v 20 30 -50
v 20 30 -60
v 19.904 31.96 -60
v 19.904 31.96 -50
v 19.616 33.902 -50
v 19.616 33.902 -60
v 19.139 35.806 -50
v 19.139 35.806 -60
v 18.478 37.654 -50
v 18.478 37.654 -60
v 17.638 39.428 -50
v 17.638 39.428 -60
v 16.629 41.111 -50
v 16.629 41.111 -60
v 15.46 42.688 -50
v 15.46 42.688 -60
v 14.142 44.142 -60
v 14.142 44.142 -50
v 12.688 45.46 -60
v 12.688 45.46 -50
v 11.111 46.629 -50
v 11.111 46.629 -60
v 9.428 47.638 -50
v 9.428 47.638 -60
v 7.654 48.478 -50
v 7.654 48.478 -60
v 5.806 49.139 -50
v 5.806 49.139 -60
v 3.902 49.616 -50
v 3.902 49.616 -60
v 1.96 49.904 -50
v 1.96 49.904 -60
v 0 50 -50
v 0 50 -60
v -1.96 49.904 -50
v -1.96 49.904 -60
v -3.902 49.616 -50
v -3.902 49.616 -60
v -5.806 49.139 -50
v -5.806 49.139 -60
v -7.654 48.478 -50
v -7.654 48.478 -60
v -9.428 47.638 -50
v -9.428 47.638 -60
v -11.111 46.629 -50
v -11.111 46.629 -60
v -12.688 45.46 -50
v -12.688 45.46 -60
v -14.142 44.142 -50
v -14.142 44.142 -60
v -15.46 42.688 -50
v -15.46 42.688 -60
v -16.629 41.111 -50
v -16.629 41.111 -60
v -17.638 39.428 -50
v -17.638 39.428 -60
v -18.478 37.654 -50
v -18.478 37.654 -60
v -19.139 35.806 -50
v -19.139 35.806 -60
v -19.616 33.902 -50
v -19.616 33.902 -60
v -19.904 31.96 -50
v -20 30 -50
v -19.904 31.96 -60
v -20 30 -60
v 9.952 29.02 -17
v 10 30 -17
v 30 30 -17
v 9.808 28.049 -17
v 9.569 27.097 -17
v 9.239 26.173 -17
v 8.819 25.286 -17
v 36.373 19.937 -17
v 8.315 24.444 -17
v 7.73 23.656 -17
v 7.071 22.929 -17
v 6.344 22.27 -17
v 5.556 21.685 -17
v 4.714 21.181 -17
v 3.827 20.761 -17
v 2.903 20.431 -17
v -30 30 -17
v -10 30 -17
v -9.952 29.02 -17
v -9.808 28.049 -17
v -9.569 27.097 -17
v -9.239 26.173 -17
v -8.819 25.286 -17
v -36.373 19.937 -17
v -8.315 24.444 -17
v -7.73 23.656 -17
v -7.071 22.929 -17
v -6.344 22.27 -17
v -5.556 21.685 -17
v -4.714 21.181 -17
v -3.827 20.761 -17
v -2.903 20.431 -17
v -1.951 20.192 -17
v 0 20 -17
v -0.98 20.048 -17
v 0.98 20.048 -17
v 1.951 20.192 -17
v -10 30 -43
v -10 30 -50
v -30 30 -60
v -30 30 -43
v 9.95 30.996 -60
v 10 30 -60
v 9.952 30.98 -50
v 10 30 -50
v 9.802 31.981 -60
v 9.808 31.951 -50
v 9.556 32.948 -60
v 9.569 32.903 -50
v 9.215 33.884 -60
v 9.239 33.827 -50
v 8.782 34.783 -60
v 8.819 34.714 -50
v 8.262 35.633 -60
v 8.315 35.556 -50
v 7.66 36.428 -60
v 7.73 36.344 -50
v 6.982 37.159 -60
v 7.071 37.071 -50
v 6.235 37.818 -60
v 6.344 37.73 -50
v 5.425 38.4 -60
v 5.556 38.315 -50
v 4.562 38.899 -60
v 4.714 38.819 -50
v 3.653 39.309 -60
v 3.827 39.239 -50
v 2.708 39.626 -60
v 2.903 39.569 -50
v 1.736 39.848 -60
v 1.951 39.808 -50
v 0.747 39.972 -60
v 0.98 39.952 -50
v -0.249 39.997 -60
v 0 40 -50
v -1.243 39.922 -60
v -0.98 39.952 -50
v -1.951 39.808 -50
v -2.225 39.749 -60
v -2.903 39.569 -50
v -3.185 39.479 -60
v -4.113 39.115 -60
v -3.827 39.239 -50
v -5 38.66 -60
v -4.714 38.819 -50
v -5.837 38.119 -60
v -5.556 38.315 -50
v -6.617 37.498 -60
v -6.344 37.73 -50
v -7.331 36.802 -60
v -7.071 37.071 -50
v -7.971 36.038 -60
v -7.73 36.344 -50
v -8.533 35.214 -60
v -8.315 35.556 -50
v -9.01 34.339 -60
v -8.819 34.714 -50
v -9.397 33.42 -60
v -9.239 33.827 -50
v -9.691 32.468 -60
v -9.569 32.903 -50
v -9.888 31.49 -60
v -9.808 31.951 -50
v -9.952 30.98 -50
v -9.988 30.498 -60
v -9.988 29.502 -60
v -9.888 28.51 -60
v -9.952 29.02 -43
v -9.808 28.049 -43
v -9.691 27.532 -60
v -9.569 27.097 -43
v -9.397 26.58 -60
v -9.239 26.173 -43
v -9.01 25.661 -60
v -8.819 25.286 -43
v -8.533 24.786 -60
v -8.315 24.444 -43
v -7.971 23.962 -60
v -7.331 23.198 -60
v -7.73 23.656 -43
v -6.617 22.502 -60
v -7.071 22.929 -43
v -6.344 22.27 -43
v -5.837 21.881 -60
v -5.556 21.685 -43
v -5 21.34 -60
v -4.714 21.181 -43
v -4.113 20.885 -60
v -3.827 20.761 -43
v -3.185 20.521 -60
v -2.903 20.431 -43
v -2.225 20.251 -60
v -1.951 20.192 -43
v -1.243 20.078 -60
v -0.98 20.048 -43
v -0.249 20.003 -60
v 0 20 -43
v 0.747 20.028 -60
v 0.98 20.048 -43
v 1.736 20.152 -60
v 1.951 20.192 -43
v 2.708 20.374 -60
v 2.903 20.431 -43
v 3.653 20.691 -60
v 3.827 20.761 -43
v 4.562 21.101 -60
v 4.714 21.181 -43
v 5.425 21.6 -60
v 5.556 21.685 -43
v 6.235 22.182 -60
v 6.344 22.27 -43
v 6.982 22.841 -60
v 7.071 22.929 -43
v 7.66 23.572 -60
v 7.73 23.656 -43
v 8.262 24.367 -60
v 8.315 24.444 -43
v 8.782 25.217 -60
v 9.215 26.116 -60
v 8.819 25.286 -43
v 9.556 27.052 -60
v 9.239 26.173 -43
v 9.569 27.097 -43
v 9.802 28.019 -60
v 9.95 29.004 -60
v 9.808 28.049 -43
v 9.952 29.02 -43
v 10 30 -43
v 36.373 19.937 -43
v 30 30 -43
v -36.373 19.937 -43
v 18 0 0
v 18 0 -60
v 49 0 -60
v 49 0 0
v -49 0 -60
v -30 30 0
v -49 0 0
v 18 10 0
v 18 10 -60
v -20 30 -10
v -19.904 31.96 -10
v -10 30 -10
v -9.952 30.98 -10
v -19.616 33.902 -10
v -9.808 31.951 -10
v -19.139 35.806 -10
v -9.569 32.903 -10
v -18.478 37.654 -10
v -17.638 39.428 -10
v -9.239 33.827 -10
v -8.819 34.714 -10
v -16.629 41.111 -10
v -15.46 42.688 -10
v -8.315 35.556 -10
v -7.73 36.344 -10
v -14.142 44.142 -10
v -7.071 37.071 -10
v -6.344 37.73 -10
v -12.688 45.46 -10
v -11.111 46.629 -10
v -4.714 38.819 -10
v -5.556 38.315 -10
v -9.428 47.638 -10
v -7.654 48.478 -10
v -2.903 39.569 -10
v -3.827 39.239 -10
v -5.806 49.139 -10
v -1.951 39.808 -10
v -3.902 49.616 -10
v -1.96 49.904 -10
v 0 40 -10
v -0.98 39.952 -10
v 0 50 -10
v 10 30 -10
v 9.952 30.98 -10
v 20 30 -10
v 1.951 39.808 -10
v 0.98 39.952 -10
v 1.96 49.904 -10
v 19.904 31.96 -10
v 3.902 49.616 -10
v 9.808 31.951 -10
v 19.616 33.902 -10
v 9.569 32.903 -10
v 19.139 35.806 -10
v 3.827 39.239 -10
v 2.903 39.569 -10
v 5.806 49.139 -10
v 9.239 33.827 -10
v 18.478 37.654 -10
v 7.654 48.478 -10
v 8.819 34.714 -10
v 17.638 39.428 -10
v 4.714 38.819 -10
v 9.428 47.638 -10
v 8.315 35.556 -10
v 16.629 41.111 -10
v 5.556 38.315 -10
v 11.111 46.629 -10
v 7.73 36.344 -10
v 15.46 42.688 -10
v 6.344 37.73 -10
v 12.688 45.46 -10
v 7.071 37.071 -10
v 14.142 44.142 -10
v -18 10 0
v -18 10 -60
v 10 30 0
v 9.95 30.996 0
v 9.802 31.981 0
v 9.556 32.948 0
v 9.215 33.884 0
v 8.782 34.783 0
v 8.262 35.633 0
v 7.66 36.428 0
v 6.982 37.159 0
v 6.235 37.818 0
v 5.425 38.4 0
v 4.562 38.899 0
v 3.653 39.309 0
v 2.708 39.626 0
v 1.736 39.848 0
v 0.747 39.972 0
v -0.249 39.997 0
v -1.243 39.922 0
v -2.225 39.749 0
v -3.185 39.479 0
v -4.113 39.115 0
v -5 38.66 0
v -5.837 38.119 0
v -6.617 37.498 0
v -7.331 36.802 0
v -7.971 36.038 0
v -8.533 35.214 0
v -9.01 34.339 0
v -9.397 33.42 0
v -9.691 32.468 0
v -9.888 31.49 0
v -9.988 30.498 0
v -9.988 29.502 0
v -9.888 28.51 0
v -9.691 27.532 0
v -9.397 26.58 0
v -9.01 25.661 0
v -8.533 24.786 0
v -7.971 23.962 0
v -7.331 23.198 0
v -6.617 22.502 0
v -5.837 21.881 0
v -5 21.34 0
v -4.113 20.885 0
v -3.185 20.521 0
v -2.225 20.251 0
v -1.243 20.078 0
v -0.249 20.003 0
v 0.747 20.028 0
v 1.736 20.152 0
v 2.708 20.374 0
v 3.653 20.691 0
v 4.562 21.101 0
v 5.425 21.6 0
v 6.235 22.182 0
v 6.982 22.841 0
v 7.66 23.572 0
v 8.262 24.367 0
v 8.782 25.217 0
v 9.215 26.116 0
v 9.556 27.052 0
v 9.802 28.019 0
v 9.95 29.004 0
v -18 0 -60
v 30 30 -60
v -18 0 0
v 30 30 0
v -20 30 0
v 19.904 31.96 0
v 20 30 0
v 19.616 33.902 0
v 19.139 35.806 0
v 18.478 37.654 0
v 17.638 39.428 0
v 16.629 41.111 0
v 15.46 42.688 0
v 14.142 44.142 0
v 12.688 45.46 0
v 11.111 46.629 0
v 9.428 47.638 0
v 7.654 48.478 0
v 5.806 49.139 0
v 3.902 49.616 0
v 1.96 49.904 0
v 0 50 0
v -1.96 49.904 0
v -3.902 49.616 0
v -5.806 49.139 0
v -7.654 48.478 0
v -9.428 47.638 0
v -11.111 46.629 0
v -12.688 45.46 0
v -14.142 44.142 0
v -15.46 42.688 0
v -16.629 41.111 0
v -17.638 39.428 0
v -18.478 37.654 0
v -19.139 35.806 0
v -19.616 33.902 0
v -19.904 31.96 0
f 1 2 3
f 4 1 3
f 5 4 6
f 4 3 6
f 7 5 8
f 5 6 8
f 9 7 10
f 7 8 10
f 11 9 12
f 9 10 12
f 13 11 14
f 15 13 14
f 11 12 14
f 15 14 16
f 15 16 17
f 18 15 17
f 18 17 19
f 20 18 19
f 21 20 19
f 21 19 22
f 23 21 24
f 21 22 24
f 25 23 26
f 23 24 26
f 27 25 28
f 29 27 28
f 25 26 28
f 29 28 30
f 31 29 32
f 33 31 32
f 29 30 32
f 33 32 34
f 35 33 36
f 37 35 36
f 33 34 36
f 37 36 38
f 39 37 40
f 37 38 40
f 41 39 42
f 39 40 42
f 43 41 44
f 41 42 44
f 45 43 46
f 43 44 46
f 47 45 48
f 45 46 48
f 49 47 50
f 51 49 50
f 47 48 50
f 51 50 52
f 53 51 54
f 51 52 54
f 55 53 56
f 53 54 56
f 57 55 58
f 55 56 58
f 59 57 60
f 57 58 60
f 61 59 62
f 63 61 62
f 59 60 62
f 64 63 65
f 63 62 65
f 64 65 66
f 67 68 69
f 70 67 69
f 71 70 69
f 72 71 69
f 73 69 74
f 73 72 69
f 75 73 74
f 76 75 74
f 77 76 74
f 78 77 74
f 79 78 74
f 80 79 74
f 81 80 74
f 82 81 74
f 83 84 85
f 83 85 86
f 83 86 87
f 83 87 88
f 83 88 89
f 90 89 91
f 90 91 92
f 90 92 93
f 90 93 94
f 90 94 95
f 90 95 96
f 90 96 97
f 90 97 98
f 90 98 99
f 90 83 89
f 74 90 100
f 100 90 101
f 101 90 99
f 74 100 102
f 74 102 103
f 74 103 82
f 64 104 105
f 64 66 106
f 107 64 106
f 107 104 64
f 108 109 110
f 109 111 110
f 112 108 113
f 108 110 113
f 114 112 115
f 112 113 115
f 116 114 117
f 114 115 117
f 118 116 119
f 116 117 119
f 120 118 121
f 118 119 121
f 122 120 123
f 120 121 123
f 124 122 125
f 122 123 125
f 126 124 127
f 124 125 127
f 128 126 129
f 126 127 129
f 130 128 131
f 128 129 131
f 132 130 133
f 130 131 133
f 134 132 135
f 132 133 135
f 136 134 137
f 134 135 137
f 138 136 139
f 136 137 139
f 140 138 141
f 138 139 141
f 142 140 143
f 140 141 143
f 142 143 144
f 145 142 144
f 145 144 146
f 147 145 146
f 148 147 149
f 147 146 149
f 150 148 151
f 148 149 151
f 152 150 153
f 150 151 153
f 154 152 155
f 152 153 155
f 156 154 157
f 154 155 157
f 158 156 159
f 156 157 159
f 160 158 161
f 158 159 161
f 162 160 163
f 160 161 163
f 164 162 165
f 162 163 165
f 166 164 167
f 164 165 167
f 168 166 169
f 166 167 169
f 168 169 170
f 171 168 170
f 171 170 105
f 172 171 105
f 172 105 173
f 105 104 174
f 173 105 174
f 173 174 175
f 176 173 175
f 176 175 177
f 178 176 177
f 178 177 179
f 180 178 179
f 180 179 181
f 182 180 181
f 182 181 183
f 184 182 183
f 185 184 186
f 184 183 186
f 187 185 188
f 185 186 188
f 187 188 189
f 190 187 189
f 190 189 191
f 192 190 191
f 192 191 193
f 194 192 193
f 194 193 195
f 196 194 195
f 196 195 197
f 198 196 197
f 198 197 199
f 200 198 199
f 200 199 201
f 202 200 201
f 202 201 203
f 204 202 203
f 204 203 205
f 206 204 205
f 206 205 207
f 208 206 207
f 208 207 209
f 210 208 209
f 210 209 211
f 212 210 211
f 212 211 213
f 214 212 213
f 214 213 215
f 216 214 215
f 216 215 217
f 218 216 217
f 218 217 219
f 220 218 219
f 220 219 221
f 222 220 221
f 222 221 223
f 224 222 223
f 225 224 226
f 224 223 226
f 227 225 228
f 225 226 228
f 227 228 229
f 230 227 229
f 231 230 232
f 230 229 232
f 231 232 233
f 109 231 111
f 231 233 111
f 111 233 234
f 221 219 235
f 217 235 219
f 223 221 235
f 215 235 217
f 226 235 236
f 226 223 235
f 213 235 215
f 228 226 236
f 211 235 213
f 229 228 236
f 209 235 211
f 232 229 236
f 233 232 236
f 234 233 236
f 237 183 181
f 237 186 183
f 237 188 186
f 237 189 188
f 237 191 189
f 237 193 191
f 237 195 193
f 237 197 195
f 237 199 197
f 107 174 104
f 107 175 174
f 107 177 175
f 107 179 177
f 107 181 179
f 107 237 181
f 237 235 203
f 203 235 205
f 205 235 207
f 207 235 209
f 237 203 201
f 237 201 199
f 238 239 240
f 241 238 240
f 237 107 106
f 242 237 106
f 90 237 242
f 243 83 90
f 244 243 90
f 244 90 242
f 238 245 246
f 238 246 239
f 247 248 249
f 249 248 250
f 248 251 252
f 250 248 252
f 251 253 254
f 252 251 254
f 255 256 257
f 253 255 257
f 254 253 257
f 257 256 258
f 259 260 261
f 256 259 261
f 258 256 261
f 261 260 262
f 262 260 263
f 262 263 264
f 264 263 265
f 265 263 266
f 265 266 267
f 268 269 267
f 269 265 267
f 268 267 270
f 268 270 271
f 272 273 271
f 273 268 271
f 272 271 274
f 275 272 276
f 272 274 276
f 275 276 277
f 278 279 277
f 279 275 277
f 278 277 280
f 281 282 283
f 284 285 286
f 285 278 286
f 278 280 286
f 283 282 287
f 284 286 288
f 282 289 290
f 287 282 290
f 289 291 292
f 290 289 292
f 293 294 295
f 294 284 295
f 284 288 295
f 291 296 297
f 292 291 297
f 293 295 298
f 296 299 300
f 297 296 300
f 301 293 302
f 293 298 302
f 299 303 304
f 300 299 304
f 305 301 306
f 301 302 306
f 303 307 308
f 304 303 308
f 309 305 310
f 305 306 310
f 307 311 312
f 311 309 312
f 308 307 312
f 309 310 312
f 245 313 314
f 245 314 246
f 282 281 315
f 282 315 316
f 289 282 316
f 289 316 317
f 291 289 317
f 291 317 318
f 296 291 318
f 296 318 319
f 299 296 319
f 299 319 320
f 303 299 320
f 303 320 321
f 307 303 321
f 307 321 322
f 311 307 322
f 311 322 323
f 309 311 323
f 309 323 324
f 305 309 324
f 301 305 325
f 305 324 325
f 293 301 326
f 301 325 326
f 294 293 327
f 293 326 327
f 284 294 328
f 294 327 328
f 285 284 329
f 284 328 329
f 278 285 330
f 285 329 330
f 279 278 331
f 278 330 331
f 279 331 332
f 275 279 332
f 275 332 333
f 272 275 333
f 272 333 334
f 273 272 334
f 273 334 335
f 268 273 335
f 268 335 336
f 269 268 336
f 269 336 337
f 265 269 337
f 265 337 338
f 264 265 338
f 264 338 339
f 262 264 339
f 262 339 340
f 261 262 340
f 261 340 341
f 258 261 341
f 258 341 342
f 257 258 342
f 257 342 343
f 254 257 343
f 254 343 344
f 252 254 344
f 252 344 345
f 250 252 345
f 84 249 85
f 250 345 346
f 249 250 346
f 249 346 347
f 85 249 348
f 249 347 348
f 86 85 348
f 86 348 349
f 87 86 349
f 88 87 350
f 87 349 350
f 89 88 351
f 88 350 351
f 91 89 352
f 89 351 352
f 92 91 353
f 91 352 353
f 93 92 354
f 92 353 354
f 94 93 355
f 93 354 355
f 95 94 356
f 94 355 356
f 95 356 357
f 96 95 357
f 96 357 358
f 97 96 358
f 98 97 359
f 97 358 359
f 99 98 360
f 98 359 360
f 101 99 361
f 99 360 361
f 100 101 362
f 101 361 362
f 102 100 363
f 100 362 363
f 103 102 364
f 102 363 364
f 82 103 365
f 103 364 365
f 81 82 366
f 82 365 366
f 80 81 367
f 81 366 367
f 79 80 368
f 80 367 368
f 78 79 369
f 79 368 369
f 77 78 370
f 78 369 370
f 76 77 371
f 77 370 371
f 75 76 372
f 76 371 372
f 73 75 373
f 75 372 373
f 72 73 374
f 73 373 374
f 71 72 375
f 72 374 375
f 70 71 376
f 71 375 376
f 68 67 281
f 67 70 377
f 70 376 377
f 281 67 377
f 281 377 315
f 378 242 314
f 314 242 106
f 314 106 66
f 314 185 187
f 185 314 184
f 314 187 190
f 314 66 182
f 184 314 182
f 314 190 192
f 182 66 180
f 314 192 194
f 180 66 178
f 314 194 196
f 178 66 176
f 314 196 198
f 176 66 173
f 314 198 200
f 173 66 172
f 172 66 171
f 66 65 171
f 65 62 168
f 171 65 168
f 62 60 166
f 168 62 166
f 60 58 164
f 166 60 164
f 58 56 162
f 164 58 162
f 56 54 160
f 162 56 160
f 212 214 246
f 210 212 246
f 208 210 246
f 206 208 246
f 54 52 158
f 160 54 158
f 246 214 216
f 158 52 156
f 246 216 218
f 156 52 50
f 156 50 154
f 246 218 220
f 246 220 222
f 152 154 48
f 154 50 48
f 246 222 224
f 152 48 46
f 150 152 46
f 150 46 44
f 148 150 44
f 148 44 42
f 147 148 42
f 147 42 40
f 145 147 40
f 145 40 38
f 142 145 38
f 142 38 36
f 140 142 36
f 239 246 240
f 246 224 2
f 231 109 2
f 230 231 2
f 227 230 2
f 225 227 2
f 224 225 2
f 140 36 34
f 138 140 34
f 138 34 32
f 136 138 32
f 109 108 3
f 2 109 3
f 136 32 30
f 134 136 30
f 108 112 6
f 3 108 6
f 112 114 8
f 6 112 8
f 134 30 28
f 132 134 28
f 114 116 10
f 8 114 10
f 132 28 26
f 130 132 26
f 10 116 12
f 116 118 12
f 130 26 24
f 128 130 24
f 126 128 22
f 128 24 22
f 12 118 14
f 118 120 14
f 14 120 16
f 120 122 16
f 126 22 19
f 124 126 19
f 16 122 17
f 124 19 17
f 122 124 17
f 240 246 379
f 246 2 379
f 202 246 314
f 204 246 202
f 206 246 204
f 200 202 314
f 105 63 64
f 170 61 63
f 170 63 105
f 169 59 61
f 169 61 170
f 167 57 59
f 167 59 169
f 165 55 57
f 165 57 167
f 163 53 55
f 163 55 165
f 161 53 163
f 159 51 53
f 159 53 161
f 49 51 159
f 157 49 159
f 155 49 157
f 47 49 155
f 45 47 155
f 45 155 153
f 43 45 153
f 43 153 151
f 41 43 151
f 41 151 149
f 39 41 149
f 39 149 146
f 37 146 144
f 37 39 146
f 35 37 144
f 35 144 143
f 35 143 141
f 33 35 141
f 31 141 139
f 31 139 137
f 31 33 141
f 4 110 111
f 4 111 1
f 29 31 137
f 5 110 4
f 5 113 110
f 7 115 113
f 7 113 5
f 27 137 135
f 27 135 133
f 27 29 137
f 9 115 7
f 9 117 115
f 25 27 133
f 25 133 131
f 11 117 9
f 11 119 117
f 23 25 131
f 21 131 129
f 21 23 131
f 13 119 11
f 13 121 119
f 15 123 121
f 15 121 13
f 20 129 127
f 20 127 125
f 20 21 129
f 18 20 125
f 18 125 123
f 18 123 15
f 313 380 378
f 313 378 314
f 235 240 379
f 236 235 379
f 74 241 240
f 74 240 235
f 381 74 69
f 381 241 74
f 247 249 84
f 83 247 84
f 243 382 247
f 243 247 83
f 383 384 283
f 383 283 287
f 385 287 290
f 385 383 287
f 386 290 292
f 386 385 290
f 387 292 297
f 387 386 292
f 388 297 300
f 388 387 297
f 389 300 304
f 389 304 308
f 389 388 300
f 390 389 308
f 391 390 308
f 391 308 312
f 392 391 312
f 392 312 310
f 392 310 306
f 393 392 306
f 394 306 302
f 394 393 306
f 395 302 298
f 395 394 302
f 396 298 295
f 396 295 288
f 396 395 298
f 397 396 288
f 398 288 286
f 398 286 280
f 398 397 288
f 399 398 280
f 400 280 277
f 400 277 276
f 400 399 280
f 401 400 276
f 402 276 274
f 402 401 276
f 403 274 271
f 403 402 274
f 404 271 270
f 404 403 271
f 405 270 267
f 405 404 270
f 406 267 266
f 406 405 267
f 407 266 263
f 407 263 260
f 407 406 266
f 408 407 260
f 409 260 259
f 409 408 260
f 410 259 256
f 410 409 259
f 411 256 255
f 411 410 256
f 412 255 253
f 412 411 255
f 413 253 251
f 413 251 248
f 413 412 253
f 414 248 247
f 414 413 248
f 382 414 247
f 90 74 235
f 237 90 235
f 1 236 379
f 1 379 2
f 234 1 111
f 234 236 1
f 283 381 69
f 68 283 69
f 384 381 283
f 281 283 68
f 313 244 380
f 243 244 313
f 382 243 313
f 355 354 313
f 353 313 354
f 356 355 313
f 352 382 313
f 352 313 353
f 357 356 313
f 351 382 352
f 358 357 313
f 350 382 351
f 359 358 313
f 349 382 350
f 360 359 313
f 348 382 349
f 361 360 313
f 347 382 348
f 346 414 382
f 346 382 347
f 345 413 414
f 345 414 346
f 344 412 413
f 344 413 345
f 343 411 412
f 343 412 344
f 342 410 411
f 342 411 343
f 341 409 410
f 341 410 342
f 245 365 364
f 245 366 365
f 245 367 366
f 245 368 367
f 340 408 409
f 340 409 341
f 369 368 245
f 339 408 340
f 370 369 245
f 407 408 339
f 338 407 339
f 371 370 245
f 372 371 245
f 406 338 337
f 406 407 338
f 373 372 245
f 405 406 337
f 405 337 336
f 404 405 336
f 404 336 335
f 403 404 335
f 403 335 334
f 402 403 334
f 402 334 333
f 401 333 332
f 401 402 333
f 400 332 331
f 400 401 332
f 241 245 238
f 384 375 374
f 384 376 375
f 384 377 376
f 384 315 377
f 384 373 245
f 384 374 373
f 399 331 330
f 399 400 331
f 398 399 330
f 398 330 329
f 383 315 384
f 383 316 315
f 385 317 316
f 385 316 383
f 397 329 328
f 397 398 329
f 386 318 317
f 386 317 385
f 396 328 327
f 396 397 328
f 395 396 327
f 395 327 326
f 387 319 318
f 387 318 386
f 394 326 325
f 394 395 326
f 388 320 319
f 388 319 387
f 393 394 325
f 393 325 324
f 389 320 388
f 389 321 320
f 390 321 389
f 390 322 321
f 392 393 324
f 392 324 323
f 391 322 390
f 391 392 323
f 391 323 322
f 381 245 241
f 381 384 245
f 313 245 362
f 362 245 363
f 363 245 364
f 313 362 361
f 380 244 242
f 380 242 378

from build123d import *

# Parameters (mm, degrees)
BOSS_EXTRUDE1_DEPTH     = 60
CUT_EXTRUDE1_DEPTH      = 104.638795825
CUT_EXTRUDE1_DEPTH_BACK = 104.638795825
BOSS_EXTRUDE2_DEPTH     = 10
SKETCH5_R               = 10
CUT_EXTRUDE2_DEPTH      = 93.200867675


with BuildPart() as part:
    # Sketch1 → Boss-Extrude1 (new body)
    with BuildSketch(Plane.XY):
        Polygon((-30, 30), (-49, 0), (-18, 0), (-18, 10), (0, 10), (0, 30), (-20, 30), align=None)
        Polygon((20, 30), (0, 30), (0, 10), (18, 10), (18, 0), (49, 0), (30, 30), align=None)
    extrude(amount=-BOSS_EXTRUDE1_DEPTH)

    # Sketch3 → Cut-Extrude1 (cut, two sides: drawn at the far end of the back side and taken through both)
    with BuildSketch(Plane(origin=(30, 0, 0), x_dir=(0, 0, -1), z_dir=(1, 0, 0)).offset(-CUT_EXTRUDE1_DEPTH_BACK)):
        Polygon((17, 144.861813831), (17, 30), (17, 19.936985668), (43, 19.936985668), (43, 30), (43, 144.861813831), (43, 374.585441494), (17, 374.585441494), align=None)
    extrude(amount=CUT_EXTRUDE1_DEPTH + CUT_EXTRUDE1_DEPTH_BACK, mode=Mode.SUBTRACT)

    # Sketch4 → Boss-Extrude2 (add)
    with BuildSketch(Plane.XY):
        with BuildLine():
            Line((-20, 30), (20, 30))
            ThreePointArc((20, 30), (0, 50), (-20, 30))
        make_face()
    boss_extrude2 = extrude(amount=-BOSS_EXTRUDE2_DEPTH)

    # Sketch5 → Cut-Extrude2 (cut, through all)
    with BuildSketch(Plane.XY):
        with Locations((0, 30)):
            Circle(SKETCH5_R)
    cut_extrude2 = extrude(amount=-CUT_EXTRUDE2_DEPTH, mode=Mode.SUBTRACT)

    # Mirror1: Boss-Extrude2 across plane
    add(boss_extrude2.mirror(Plane.XY.offset(-30)))

    # Mirror2: Cut-Extrude2 across plane
    add(cut_extrude2.mirror(Plane.XY.offset(-30)), mode=Mode.SUBTRACT)


solid = part.part
